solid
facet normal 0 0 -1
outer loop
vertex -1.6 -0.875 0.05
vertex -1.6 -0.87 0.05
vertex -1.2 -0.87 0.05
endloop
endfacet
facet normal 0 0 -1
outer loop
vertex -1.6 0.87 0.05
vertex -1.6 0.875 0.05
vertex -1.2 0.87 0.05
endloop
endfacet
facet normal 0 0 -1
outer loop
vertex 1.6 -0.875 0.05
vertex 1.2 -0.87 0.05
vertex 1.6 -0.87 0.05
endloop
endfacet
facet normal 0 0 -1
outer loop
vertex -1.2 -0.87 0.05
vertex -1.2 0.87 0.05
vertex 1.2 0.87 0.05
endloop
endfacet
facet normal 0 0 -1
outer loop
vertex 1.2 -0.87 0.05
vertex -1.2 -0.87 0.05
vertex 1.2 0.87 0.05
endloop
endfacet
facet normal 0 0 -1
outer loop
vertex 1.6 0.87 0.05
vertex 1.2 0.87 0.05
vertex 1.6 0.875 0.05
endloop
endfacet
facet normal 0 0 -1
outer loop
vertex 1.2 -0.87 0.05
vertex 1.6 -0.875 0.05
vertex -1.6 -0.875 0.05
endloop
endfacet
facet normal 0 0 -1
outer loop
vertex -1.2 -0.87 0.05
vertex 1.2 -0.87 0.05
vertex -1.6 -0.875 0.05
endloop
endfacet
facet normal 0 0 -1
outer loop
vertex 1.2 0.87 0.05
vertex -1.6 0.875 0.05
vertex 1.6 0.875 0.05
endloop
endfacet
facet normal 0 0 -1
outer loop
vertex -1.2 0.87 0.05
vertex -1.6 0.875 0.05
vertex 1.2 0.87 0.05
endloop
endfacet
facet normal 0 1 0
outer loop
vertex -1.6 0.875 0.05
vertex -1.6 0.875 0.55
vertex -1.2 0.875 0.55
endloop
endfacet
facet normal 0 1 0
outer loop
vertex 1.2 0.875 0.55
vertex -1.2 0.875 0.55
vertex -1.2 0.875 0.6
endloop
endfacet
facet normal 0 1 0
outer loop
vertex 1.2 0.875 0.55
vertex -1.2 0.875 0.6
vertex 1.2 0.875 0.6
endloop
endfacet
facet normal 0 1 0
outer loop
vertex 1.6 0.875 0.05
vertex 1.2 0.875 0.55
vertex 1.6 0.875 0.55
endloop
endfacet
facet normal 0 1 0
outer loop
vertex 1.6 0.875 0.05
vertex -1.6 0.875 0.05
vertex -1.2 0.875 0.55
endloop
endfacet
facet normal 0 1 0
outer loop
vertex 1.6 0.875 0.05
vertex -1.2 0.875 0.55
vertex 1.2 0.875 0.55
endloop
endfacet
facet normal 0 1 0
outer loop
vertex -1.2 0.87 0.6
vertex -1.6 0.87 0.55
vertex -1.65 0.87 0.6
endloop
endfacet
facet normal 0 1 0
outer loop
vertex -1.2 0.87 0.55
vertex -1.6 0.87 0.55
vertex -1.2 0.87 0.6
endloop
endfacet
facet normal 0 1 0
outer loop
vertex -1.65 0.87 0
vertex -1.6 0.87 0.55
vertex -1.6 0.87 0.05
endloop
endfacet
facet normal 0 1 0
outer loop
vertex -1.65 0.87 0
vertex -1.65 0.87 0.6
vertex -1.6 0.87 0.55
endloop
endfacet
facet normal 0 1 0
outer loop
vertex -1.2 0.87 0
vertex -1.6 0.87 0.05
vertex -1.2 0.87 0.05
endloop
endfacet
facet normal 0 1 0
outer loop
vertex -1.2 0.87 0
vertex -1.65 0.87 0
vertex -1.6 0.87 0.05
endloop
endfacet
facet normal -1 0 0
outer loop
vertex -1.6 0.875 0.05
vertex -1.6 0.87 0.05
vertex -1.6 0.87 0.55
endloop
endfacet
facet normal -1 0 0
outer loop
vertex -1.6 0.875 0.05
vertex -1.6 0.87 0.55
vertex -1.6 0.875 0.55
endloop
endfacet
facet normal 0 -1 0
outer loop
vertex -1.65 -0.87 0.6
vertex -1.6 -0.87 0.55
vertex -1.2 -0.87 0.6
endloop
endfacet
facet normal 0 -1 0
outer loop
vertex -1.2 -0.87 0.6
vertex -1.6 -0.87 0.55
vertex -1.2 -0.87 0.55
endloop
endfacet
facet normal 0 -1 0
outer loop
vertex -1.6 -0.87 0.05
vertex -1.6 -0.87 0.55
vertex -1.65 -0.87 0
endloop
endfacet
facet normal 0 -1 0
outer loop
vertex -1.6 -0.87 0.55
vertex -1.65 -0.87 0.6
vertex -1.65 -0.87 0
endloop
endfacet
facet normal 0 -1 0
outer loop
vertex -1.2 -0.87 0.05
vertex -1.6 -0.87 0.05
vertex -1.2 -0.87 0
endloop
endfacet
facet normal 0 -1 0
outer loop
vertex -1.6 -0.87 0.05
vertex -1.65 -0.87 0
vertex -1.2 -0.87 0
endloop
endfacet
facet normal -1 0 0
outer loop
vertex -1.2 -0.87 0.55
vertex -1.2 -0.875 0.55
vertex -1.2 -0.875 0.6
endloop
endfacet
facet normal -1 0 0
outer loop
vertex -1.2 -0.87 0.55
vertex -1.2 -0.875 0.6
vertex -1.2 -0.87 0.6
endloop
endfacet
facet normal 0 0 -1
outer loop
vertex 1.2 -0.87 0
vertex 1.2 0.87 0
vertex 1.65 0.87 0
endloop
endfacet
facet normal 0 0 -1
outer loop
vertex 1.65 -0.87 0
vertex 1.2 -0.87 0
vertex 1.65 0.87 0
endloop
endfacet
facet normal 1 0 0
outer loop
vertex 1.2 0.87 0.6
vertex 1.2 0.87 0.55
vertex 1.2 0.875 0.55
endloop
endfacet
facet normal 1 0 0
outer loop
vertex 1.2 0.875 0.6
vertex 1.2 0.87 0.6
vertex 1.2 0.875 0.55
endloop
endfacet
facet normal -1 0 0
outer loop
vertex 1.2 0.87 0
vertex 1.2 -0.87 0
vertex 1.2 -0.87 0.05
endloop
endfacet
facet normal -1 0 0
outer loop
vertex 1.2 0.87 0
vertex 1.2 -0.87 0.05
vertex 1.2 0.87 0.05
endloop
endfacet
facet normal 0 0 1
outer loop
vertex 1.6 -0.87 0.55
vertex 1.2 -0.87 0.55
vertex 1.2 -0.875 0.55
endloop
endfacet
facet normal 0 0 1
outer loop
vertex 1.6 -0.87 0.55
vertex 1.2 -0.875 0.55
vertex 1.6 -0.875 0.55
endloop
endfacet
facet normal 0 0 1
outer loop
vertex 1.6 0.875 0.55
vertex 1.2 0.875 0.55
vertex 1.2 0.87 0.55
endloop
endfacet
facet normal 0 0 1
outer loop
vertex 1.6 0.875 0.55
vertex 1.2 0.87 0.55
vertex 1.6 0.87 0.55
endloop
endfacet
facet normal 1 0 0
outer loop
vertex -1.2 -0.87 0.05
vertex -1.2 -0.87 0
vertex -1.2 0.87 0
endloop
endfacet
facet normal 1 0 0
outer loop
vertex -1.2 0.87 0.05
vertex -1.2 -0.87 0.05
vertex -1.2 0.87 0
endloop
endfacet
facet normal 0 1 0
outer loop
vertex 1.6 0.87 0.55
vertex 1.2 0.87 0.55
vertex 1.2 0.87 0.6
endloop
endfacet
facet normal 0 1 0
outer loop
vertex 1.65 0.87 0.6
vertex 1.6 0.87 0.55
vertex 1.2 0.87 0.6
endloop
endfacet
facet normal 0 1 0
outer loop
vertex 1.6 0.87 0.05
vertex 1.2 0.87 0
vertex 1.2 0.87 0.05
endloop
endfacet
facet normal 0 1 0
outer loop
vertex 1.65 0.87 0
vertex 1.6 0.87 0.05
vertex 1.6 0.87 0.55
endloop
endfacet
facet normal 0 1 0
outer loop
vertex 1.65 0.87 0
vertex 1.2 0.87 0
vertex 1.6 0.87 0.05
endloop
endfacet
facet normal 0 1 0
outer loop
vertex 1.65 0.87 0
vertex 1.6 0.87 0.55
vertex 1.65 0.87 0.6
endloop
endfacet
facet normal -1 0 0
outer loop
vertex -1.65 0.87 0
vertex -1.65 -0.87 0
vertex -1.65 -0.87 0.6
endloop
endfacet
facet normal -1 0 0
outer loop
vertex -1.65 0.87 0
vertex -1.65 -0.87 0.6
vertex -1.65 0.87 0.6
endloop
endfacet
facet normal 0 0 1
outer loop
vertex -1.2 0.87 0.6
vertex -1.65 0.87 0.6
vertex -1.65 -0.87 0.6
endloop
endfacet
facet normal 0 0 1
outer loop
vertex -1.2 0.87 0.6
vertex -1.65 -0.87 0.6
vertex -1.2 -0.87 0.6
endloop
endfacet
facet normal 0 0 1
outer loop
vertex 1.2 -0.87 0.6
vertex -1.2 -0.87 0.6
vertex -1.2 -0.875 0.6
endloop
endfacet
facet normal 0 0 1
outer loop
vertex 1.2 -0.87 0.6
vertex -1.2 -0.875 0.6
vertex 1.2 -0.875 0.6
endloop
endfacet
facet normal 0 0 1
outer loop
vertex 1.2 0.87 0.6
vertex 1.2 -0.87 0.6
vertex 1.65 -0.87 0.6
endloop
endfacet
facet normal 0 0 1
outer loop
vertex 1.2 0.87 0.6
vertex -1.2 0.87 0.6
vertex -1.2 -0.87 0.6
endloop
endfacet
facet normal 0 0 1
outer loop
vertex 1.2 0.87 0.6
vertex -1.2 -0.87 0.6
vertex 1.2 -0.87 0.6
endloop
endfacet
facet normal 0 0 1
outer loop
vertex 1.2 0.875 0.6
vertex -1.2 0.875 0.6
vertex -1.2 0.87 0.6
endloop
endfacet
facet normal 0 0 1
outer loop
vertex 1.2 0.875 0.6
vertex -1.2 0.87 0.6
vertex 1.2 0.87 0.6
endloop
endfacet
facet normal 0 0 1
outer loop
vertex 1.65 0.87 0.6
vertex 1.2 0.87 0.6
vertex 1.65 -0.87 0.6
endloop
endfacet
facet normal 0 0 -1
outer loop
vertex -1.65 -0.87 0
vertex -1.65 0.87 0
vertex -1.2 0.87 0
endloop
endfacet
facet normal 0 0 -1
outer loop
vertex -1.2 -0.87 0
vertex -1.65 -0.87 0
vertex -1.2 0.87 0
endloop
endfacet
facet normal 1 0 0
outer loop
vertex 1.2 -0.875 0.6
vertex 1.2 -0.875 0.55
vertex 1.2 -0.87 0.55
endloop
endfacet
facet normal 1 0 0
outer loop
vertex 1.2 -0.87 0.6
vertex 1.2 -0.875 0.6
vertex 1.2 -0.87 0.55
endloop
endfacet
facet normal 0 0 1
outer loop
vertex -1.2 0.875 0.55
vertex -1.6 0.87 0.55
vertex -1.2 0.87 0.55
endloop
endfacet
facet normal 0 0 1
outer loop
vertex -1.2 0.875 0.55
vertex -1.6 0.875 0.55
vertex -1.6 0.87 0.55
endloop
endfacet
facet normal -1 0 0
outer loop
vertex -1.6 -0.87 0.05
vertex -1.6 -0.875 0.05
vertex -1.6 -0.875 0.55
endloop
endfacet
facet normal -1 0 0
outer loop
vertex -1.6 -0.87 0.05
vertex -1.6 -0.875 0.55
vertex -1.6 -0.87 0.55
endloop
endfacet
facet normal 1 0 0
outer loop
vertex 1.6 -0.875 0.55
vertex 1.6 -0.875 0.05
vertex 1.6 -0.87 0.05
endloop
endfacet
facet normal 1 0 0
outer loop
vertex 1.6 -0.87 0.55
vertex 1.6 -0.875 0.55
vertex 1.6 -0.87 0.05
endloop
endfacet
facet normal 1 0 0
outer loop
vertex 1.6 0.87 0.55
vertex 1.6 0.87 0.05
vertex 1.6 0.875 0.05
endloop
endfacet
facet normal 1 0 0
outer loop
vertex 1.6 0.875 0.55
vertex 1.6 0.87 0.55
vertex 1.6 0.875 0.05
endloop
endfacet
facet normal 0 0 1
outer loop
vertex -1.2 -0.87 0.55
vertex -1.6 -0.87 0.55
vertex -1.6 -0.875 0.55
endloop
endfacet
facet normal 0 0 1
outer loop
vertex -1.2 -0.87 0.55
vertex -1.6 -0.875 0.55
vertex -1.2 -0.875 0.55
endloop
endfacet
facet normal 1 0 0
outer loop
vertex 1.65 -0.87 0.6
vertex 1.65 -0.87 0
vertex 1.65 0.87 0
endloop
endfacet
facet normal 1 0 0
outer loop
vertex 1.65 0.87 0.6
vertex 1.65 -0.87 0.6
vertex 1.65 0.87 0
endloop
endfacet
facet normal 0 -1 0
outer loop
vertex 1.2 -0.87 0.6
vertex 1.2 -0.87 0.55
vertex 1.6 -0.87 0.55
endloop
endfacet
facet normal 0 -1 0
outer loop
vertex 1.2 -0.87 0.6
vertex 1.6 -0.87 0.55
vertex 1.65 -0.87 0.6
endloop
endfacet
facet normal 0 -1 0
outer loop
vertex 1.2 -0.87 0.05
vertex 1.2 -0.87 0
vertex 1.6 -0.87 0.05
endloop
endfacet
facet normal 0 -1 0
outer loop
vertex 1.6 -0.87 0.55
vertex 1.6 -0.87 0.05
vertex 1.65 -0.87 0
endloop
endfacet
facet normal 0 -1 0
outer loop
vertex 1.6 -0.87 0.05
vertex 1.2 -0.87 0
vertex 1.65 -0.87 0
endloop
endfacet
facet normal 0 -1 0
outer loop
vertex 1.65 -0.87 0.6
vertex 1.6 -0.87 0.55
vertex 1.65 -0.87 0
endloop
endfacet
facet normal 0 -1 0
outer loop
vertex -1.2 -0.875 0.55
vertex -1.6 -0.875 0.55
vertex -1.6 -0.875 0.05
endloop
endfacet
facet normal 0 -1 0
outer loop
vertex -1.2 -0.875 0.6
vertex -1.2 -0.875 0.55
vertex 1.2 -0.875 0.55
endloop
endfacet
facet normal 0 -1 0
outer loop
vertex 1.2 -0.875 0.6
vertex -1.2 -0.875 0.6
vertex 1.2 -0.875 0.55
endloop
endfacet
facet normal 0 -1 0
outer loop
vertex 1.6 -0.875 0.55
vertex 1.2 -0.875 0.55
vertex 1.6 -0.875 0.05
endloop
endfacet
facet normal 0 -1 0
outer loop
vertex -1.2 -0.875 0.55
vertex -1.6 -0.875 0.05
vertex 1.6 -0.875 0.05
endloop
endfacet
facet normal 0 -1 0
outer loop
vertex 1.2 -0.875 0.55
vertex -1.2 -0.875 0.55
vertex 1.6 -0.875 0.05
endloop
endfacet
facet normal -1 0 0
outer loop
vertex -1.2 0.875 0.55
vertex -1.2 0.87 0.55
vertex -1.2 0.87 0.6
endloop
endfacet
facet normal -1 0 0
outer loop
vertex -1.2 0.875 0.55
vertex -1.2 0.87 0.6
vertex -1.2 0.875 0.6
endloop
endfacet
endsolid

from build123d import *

# Parameters (mm, degrees)
PLATING_LEFT_W      = 0.45
PLATING_LEFT_H      = 1.74
PLATING_LEFT_DEPTH  = 0.6
PLATING_RIGHT_W     = 0.45
PLATING_RIGHT_H     = 1.74
PLATING_RIGHT_DEPTH = 0.6
MARKING_W           = 2.4
MARKING_H           = 1.75
MARKING_DEPTH       = 0.05
CHIP_W              = 3.2
CHIP_H              = 1.75
CHIP_DEPTH          = 0.5


with BuildPart() as plating_left:
    # plating_left → plating_left (new body)
    with BuildSketch(Plane(origin=(-1.65, -0.87, 0), x_dir=(1, 0, 0), z_dir=(0, 0, 1))):
        with Locations((0.225, 0.87)):
            Rectangle(PLATING_LEFT_W, PLATING_LEFT_H)
    extrude(amount=PLATING_LEFT_DEPTH)


with BuildPart() as plating_right:
    # plating_right → plating_right (new body)
    with BuildSketch(Plane(origin=(1.2, -0.87, 0), x_dir=(1, 0, 0), z_dir=(0, 0, 1))):
        with Locations((0.225, 0.87)):
            Rectangle(PLATING_RIGHT_W, PLATING_RIGHT_H)
    extrude(amount=PLATING_RIGHT_DEPTH)


with BuildPart() as marking:
    # marking → marking (new body)
    with BuildSketch(Plane(origin=(-1.2, -0.875, 0.55), x_dir=(1, 0, 0), z_dir=(0, 0, 1))):
        with Locations((1.2, 0.875)):
            Rectangle(MARKING_W, MARKING_H)
    extrude(amount=MARKING_DEPTH)


with BuildPart() as resistor:
    # chip → chip (new body)
    with BuildSketch(Plane(origin=(-1.6, -0.875, 0.05), x_dir=(1, 0, 0), z_dir=(0, 0, 1))):
        with Locations((1.6, 0.875)):
            Rectangle(CHIP_W, CHIP_H)
    extrude(amount=CHIP_DEPTH)

    # resistor: union plating_left, plating_right, marking
    add(plating_left.part)
    add(plating_right.part)
    add(marking.part)


solid = resistor.part
